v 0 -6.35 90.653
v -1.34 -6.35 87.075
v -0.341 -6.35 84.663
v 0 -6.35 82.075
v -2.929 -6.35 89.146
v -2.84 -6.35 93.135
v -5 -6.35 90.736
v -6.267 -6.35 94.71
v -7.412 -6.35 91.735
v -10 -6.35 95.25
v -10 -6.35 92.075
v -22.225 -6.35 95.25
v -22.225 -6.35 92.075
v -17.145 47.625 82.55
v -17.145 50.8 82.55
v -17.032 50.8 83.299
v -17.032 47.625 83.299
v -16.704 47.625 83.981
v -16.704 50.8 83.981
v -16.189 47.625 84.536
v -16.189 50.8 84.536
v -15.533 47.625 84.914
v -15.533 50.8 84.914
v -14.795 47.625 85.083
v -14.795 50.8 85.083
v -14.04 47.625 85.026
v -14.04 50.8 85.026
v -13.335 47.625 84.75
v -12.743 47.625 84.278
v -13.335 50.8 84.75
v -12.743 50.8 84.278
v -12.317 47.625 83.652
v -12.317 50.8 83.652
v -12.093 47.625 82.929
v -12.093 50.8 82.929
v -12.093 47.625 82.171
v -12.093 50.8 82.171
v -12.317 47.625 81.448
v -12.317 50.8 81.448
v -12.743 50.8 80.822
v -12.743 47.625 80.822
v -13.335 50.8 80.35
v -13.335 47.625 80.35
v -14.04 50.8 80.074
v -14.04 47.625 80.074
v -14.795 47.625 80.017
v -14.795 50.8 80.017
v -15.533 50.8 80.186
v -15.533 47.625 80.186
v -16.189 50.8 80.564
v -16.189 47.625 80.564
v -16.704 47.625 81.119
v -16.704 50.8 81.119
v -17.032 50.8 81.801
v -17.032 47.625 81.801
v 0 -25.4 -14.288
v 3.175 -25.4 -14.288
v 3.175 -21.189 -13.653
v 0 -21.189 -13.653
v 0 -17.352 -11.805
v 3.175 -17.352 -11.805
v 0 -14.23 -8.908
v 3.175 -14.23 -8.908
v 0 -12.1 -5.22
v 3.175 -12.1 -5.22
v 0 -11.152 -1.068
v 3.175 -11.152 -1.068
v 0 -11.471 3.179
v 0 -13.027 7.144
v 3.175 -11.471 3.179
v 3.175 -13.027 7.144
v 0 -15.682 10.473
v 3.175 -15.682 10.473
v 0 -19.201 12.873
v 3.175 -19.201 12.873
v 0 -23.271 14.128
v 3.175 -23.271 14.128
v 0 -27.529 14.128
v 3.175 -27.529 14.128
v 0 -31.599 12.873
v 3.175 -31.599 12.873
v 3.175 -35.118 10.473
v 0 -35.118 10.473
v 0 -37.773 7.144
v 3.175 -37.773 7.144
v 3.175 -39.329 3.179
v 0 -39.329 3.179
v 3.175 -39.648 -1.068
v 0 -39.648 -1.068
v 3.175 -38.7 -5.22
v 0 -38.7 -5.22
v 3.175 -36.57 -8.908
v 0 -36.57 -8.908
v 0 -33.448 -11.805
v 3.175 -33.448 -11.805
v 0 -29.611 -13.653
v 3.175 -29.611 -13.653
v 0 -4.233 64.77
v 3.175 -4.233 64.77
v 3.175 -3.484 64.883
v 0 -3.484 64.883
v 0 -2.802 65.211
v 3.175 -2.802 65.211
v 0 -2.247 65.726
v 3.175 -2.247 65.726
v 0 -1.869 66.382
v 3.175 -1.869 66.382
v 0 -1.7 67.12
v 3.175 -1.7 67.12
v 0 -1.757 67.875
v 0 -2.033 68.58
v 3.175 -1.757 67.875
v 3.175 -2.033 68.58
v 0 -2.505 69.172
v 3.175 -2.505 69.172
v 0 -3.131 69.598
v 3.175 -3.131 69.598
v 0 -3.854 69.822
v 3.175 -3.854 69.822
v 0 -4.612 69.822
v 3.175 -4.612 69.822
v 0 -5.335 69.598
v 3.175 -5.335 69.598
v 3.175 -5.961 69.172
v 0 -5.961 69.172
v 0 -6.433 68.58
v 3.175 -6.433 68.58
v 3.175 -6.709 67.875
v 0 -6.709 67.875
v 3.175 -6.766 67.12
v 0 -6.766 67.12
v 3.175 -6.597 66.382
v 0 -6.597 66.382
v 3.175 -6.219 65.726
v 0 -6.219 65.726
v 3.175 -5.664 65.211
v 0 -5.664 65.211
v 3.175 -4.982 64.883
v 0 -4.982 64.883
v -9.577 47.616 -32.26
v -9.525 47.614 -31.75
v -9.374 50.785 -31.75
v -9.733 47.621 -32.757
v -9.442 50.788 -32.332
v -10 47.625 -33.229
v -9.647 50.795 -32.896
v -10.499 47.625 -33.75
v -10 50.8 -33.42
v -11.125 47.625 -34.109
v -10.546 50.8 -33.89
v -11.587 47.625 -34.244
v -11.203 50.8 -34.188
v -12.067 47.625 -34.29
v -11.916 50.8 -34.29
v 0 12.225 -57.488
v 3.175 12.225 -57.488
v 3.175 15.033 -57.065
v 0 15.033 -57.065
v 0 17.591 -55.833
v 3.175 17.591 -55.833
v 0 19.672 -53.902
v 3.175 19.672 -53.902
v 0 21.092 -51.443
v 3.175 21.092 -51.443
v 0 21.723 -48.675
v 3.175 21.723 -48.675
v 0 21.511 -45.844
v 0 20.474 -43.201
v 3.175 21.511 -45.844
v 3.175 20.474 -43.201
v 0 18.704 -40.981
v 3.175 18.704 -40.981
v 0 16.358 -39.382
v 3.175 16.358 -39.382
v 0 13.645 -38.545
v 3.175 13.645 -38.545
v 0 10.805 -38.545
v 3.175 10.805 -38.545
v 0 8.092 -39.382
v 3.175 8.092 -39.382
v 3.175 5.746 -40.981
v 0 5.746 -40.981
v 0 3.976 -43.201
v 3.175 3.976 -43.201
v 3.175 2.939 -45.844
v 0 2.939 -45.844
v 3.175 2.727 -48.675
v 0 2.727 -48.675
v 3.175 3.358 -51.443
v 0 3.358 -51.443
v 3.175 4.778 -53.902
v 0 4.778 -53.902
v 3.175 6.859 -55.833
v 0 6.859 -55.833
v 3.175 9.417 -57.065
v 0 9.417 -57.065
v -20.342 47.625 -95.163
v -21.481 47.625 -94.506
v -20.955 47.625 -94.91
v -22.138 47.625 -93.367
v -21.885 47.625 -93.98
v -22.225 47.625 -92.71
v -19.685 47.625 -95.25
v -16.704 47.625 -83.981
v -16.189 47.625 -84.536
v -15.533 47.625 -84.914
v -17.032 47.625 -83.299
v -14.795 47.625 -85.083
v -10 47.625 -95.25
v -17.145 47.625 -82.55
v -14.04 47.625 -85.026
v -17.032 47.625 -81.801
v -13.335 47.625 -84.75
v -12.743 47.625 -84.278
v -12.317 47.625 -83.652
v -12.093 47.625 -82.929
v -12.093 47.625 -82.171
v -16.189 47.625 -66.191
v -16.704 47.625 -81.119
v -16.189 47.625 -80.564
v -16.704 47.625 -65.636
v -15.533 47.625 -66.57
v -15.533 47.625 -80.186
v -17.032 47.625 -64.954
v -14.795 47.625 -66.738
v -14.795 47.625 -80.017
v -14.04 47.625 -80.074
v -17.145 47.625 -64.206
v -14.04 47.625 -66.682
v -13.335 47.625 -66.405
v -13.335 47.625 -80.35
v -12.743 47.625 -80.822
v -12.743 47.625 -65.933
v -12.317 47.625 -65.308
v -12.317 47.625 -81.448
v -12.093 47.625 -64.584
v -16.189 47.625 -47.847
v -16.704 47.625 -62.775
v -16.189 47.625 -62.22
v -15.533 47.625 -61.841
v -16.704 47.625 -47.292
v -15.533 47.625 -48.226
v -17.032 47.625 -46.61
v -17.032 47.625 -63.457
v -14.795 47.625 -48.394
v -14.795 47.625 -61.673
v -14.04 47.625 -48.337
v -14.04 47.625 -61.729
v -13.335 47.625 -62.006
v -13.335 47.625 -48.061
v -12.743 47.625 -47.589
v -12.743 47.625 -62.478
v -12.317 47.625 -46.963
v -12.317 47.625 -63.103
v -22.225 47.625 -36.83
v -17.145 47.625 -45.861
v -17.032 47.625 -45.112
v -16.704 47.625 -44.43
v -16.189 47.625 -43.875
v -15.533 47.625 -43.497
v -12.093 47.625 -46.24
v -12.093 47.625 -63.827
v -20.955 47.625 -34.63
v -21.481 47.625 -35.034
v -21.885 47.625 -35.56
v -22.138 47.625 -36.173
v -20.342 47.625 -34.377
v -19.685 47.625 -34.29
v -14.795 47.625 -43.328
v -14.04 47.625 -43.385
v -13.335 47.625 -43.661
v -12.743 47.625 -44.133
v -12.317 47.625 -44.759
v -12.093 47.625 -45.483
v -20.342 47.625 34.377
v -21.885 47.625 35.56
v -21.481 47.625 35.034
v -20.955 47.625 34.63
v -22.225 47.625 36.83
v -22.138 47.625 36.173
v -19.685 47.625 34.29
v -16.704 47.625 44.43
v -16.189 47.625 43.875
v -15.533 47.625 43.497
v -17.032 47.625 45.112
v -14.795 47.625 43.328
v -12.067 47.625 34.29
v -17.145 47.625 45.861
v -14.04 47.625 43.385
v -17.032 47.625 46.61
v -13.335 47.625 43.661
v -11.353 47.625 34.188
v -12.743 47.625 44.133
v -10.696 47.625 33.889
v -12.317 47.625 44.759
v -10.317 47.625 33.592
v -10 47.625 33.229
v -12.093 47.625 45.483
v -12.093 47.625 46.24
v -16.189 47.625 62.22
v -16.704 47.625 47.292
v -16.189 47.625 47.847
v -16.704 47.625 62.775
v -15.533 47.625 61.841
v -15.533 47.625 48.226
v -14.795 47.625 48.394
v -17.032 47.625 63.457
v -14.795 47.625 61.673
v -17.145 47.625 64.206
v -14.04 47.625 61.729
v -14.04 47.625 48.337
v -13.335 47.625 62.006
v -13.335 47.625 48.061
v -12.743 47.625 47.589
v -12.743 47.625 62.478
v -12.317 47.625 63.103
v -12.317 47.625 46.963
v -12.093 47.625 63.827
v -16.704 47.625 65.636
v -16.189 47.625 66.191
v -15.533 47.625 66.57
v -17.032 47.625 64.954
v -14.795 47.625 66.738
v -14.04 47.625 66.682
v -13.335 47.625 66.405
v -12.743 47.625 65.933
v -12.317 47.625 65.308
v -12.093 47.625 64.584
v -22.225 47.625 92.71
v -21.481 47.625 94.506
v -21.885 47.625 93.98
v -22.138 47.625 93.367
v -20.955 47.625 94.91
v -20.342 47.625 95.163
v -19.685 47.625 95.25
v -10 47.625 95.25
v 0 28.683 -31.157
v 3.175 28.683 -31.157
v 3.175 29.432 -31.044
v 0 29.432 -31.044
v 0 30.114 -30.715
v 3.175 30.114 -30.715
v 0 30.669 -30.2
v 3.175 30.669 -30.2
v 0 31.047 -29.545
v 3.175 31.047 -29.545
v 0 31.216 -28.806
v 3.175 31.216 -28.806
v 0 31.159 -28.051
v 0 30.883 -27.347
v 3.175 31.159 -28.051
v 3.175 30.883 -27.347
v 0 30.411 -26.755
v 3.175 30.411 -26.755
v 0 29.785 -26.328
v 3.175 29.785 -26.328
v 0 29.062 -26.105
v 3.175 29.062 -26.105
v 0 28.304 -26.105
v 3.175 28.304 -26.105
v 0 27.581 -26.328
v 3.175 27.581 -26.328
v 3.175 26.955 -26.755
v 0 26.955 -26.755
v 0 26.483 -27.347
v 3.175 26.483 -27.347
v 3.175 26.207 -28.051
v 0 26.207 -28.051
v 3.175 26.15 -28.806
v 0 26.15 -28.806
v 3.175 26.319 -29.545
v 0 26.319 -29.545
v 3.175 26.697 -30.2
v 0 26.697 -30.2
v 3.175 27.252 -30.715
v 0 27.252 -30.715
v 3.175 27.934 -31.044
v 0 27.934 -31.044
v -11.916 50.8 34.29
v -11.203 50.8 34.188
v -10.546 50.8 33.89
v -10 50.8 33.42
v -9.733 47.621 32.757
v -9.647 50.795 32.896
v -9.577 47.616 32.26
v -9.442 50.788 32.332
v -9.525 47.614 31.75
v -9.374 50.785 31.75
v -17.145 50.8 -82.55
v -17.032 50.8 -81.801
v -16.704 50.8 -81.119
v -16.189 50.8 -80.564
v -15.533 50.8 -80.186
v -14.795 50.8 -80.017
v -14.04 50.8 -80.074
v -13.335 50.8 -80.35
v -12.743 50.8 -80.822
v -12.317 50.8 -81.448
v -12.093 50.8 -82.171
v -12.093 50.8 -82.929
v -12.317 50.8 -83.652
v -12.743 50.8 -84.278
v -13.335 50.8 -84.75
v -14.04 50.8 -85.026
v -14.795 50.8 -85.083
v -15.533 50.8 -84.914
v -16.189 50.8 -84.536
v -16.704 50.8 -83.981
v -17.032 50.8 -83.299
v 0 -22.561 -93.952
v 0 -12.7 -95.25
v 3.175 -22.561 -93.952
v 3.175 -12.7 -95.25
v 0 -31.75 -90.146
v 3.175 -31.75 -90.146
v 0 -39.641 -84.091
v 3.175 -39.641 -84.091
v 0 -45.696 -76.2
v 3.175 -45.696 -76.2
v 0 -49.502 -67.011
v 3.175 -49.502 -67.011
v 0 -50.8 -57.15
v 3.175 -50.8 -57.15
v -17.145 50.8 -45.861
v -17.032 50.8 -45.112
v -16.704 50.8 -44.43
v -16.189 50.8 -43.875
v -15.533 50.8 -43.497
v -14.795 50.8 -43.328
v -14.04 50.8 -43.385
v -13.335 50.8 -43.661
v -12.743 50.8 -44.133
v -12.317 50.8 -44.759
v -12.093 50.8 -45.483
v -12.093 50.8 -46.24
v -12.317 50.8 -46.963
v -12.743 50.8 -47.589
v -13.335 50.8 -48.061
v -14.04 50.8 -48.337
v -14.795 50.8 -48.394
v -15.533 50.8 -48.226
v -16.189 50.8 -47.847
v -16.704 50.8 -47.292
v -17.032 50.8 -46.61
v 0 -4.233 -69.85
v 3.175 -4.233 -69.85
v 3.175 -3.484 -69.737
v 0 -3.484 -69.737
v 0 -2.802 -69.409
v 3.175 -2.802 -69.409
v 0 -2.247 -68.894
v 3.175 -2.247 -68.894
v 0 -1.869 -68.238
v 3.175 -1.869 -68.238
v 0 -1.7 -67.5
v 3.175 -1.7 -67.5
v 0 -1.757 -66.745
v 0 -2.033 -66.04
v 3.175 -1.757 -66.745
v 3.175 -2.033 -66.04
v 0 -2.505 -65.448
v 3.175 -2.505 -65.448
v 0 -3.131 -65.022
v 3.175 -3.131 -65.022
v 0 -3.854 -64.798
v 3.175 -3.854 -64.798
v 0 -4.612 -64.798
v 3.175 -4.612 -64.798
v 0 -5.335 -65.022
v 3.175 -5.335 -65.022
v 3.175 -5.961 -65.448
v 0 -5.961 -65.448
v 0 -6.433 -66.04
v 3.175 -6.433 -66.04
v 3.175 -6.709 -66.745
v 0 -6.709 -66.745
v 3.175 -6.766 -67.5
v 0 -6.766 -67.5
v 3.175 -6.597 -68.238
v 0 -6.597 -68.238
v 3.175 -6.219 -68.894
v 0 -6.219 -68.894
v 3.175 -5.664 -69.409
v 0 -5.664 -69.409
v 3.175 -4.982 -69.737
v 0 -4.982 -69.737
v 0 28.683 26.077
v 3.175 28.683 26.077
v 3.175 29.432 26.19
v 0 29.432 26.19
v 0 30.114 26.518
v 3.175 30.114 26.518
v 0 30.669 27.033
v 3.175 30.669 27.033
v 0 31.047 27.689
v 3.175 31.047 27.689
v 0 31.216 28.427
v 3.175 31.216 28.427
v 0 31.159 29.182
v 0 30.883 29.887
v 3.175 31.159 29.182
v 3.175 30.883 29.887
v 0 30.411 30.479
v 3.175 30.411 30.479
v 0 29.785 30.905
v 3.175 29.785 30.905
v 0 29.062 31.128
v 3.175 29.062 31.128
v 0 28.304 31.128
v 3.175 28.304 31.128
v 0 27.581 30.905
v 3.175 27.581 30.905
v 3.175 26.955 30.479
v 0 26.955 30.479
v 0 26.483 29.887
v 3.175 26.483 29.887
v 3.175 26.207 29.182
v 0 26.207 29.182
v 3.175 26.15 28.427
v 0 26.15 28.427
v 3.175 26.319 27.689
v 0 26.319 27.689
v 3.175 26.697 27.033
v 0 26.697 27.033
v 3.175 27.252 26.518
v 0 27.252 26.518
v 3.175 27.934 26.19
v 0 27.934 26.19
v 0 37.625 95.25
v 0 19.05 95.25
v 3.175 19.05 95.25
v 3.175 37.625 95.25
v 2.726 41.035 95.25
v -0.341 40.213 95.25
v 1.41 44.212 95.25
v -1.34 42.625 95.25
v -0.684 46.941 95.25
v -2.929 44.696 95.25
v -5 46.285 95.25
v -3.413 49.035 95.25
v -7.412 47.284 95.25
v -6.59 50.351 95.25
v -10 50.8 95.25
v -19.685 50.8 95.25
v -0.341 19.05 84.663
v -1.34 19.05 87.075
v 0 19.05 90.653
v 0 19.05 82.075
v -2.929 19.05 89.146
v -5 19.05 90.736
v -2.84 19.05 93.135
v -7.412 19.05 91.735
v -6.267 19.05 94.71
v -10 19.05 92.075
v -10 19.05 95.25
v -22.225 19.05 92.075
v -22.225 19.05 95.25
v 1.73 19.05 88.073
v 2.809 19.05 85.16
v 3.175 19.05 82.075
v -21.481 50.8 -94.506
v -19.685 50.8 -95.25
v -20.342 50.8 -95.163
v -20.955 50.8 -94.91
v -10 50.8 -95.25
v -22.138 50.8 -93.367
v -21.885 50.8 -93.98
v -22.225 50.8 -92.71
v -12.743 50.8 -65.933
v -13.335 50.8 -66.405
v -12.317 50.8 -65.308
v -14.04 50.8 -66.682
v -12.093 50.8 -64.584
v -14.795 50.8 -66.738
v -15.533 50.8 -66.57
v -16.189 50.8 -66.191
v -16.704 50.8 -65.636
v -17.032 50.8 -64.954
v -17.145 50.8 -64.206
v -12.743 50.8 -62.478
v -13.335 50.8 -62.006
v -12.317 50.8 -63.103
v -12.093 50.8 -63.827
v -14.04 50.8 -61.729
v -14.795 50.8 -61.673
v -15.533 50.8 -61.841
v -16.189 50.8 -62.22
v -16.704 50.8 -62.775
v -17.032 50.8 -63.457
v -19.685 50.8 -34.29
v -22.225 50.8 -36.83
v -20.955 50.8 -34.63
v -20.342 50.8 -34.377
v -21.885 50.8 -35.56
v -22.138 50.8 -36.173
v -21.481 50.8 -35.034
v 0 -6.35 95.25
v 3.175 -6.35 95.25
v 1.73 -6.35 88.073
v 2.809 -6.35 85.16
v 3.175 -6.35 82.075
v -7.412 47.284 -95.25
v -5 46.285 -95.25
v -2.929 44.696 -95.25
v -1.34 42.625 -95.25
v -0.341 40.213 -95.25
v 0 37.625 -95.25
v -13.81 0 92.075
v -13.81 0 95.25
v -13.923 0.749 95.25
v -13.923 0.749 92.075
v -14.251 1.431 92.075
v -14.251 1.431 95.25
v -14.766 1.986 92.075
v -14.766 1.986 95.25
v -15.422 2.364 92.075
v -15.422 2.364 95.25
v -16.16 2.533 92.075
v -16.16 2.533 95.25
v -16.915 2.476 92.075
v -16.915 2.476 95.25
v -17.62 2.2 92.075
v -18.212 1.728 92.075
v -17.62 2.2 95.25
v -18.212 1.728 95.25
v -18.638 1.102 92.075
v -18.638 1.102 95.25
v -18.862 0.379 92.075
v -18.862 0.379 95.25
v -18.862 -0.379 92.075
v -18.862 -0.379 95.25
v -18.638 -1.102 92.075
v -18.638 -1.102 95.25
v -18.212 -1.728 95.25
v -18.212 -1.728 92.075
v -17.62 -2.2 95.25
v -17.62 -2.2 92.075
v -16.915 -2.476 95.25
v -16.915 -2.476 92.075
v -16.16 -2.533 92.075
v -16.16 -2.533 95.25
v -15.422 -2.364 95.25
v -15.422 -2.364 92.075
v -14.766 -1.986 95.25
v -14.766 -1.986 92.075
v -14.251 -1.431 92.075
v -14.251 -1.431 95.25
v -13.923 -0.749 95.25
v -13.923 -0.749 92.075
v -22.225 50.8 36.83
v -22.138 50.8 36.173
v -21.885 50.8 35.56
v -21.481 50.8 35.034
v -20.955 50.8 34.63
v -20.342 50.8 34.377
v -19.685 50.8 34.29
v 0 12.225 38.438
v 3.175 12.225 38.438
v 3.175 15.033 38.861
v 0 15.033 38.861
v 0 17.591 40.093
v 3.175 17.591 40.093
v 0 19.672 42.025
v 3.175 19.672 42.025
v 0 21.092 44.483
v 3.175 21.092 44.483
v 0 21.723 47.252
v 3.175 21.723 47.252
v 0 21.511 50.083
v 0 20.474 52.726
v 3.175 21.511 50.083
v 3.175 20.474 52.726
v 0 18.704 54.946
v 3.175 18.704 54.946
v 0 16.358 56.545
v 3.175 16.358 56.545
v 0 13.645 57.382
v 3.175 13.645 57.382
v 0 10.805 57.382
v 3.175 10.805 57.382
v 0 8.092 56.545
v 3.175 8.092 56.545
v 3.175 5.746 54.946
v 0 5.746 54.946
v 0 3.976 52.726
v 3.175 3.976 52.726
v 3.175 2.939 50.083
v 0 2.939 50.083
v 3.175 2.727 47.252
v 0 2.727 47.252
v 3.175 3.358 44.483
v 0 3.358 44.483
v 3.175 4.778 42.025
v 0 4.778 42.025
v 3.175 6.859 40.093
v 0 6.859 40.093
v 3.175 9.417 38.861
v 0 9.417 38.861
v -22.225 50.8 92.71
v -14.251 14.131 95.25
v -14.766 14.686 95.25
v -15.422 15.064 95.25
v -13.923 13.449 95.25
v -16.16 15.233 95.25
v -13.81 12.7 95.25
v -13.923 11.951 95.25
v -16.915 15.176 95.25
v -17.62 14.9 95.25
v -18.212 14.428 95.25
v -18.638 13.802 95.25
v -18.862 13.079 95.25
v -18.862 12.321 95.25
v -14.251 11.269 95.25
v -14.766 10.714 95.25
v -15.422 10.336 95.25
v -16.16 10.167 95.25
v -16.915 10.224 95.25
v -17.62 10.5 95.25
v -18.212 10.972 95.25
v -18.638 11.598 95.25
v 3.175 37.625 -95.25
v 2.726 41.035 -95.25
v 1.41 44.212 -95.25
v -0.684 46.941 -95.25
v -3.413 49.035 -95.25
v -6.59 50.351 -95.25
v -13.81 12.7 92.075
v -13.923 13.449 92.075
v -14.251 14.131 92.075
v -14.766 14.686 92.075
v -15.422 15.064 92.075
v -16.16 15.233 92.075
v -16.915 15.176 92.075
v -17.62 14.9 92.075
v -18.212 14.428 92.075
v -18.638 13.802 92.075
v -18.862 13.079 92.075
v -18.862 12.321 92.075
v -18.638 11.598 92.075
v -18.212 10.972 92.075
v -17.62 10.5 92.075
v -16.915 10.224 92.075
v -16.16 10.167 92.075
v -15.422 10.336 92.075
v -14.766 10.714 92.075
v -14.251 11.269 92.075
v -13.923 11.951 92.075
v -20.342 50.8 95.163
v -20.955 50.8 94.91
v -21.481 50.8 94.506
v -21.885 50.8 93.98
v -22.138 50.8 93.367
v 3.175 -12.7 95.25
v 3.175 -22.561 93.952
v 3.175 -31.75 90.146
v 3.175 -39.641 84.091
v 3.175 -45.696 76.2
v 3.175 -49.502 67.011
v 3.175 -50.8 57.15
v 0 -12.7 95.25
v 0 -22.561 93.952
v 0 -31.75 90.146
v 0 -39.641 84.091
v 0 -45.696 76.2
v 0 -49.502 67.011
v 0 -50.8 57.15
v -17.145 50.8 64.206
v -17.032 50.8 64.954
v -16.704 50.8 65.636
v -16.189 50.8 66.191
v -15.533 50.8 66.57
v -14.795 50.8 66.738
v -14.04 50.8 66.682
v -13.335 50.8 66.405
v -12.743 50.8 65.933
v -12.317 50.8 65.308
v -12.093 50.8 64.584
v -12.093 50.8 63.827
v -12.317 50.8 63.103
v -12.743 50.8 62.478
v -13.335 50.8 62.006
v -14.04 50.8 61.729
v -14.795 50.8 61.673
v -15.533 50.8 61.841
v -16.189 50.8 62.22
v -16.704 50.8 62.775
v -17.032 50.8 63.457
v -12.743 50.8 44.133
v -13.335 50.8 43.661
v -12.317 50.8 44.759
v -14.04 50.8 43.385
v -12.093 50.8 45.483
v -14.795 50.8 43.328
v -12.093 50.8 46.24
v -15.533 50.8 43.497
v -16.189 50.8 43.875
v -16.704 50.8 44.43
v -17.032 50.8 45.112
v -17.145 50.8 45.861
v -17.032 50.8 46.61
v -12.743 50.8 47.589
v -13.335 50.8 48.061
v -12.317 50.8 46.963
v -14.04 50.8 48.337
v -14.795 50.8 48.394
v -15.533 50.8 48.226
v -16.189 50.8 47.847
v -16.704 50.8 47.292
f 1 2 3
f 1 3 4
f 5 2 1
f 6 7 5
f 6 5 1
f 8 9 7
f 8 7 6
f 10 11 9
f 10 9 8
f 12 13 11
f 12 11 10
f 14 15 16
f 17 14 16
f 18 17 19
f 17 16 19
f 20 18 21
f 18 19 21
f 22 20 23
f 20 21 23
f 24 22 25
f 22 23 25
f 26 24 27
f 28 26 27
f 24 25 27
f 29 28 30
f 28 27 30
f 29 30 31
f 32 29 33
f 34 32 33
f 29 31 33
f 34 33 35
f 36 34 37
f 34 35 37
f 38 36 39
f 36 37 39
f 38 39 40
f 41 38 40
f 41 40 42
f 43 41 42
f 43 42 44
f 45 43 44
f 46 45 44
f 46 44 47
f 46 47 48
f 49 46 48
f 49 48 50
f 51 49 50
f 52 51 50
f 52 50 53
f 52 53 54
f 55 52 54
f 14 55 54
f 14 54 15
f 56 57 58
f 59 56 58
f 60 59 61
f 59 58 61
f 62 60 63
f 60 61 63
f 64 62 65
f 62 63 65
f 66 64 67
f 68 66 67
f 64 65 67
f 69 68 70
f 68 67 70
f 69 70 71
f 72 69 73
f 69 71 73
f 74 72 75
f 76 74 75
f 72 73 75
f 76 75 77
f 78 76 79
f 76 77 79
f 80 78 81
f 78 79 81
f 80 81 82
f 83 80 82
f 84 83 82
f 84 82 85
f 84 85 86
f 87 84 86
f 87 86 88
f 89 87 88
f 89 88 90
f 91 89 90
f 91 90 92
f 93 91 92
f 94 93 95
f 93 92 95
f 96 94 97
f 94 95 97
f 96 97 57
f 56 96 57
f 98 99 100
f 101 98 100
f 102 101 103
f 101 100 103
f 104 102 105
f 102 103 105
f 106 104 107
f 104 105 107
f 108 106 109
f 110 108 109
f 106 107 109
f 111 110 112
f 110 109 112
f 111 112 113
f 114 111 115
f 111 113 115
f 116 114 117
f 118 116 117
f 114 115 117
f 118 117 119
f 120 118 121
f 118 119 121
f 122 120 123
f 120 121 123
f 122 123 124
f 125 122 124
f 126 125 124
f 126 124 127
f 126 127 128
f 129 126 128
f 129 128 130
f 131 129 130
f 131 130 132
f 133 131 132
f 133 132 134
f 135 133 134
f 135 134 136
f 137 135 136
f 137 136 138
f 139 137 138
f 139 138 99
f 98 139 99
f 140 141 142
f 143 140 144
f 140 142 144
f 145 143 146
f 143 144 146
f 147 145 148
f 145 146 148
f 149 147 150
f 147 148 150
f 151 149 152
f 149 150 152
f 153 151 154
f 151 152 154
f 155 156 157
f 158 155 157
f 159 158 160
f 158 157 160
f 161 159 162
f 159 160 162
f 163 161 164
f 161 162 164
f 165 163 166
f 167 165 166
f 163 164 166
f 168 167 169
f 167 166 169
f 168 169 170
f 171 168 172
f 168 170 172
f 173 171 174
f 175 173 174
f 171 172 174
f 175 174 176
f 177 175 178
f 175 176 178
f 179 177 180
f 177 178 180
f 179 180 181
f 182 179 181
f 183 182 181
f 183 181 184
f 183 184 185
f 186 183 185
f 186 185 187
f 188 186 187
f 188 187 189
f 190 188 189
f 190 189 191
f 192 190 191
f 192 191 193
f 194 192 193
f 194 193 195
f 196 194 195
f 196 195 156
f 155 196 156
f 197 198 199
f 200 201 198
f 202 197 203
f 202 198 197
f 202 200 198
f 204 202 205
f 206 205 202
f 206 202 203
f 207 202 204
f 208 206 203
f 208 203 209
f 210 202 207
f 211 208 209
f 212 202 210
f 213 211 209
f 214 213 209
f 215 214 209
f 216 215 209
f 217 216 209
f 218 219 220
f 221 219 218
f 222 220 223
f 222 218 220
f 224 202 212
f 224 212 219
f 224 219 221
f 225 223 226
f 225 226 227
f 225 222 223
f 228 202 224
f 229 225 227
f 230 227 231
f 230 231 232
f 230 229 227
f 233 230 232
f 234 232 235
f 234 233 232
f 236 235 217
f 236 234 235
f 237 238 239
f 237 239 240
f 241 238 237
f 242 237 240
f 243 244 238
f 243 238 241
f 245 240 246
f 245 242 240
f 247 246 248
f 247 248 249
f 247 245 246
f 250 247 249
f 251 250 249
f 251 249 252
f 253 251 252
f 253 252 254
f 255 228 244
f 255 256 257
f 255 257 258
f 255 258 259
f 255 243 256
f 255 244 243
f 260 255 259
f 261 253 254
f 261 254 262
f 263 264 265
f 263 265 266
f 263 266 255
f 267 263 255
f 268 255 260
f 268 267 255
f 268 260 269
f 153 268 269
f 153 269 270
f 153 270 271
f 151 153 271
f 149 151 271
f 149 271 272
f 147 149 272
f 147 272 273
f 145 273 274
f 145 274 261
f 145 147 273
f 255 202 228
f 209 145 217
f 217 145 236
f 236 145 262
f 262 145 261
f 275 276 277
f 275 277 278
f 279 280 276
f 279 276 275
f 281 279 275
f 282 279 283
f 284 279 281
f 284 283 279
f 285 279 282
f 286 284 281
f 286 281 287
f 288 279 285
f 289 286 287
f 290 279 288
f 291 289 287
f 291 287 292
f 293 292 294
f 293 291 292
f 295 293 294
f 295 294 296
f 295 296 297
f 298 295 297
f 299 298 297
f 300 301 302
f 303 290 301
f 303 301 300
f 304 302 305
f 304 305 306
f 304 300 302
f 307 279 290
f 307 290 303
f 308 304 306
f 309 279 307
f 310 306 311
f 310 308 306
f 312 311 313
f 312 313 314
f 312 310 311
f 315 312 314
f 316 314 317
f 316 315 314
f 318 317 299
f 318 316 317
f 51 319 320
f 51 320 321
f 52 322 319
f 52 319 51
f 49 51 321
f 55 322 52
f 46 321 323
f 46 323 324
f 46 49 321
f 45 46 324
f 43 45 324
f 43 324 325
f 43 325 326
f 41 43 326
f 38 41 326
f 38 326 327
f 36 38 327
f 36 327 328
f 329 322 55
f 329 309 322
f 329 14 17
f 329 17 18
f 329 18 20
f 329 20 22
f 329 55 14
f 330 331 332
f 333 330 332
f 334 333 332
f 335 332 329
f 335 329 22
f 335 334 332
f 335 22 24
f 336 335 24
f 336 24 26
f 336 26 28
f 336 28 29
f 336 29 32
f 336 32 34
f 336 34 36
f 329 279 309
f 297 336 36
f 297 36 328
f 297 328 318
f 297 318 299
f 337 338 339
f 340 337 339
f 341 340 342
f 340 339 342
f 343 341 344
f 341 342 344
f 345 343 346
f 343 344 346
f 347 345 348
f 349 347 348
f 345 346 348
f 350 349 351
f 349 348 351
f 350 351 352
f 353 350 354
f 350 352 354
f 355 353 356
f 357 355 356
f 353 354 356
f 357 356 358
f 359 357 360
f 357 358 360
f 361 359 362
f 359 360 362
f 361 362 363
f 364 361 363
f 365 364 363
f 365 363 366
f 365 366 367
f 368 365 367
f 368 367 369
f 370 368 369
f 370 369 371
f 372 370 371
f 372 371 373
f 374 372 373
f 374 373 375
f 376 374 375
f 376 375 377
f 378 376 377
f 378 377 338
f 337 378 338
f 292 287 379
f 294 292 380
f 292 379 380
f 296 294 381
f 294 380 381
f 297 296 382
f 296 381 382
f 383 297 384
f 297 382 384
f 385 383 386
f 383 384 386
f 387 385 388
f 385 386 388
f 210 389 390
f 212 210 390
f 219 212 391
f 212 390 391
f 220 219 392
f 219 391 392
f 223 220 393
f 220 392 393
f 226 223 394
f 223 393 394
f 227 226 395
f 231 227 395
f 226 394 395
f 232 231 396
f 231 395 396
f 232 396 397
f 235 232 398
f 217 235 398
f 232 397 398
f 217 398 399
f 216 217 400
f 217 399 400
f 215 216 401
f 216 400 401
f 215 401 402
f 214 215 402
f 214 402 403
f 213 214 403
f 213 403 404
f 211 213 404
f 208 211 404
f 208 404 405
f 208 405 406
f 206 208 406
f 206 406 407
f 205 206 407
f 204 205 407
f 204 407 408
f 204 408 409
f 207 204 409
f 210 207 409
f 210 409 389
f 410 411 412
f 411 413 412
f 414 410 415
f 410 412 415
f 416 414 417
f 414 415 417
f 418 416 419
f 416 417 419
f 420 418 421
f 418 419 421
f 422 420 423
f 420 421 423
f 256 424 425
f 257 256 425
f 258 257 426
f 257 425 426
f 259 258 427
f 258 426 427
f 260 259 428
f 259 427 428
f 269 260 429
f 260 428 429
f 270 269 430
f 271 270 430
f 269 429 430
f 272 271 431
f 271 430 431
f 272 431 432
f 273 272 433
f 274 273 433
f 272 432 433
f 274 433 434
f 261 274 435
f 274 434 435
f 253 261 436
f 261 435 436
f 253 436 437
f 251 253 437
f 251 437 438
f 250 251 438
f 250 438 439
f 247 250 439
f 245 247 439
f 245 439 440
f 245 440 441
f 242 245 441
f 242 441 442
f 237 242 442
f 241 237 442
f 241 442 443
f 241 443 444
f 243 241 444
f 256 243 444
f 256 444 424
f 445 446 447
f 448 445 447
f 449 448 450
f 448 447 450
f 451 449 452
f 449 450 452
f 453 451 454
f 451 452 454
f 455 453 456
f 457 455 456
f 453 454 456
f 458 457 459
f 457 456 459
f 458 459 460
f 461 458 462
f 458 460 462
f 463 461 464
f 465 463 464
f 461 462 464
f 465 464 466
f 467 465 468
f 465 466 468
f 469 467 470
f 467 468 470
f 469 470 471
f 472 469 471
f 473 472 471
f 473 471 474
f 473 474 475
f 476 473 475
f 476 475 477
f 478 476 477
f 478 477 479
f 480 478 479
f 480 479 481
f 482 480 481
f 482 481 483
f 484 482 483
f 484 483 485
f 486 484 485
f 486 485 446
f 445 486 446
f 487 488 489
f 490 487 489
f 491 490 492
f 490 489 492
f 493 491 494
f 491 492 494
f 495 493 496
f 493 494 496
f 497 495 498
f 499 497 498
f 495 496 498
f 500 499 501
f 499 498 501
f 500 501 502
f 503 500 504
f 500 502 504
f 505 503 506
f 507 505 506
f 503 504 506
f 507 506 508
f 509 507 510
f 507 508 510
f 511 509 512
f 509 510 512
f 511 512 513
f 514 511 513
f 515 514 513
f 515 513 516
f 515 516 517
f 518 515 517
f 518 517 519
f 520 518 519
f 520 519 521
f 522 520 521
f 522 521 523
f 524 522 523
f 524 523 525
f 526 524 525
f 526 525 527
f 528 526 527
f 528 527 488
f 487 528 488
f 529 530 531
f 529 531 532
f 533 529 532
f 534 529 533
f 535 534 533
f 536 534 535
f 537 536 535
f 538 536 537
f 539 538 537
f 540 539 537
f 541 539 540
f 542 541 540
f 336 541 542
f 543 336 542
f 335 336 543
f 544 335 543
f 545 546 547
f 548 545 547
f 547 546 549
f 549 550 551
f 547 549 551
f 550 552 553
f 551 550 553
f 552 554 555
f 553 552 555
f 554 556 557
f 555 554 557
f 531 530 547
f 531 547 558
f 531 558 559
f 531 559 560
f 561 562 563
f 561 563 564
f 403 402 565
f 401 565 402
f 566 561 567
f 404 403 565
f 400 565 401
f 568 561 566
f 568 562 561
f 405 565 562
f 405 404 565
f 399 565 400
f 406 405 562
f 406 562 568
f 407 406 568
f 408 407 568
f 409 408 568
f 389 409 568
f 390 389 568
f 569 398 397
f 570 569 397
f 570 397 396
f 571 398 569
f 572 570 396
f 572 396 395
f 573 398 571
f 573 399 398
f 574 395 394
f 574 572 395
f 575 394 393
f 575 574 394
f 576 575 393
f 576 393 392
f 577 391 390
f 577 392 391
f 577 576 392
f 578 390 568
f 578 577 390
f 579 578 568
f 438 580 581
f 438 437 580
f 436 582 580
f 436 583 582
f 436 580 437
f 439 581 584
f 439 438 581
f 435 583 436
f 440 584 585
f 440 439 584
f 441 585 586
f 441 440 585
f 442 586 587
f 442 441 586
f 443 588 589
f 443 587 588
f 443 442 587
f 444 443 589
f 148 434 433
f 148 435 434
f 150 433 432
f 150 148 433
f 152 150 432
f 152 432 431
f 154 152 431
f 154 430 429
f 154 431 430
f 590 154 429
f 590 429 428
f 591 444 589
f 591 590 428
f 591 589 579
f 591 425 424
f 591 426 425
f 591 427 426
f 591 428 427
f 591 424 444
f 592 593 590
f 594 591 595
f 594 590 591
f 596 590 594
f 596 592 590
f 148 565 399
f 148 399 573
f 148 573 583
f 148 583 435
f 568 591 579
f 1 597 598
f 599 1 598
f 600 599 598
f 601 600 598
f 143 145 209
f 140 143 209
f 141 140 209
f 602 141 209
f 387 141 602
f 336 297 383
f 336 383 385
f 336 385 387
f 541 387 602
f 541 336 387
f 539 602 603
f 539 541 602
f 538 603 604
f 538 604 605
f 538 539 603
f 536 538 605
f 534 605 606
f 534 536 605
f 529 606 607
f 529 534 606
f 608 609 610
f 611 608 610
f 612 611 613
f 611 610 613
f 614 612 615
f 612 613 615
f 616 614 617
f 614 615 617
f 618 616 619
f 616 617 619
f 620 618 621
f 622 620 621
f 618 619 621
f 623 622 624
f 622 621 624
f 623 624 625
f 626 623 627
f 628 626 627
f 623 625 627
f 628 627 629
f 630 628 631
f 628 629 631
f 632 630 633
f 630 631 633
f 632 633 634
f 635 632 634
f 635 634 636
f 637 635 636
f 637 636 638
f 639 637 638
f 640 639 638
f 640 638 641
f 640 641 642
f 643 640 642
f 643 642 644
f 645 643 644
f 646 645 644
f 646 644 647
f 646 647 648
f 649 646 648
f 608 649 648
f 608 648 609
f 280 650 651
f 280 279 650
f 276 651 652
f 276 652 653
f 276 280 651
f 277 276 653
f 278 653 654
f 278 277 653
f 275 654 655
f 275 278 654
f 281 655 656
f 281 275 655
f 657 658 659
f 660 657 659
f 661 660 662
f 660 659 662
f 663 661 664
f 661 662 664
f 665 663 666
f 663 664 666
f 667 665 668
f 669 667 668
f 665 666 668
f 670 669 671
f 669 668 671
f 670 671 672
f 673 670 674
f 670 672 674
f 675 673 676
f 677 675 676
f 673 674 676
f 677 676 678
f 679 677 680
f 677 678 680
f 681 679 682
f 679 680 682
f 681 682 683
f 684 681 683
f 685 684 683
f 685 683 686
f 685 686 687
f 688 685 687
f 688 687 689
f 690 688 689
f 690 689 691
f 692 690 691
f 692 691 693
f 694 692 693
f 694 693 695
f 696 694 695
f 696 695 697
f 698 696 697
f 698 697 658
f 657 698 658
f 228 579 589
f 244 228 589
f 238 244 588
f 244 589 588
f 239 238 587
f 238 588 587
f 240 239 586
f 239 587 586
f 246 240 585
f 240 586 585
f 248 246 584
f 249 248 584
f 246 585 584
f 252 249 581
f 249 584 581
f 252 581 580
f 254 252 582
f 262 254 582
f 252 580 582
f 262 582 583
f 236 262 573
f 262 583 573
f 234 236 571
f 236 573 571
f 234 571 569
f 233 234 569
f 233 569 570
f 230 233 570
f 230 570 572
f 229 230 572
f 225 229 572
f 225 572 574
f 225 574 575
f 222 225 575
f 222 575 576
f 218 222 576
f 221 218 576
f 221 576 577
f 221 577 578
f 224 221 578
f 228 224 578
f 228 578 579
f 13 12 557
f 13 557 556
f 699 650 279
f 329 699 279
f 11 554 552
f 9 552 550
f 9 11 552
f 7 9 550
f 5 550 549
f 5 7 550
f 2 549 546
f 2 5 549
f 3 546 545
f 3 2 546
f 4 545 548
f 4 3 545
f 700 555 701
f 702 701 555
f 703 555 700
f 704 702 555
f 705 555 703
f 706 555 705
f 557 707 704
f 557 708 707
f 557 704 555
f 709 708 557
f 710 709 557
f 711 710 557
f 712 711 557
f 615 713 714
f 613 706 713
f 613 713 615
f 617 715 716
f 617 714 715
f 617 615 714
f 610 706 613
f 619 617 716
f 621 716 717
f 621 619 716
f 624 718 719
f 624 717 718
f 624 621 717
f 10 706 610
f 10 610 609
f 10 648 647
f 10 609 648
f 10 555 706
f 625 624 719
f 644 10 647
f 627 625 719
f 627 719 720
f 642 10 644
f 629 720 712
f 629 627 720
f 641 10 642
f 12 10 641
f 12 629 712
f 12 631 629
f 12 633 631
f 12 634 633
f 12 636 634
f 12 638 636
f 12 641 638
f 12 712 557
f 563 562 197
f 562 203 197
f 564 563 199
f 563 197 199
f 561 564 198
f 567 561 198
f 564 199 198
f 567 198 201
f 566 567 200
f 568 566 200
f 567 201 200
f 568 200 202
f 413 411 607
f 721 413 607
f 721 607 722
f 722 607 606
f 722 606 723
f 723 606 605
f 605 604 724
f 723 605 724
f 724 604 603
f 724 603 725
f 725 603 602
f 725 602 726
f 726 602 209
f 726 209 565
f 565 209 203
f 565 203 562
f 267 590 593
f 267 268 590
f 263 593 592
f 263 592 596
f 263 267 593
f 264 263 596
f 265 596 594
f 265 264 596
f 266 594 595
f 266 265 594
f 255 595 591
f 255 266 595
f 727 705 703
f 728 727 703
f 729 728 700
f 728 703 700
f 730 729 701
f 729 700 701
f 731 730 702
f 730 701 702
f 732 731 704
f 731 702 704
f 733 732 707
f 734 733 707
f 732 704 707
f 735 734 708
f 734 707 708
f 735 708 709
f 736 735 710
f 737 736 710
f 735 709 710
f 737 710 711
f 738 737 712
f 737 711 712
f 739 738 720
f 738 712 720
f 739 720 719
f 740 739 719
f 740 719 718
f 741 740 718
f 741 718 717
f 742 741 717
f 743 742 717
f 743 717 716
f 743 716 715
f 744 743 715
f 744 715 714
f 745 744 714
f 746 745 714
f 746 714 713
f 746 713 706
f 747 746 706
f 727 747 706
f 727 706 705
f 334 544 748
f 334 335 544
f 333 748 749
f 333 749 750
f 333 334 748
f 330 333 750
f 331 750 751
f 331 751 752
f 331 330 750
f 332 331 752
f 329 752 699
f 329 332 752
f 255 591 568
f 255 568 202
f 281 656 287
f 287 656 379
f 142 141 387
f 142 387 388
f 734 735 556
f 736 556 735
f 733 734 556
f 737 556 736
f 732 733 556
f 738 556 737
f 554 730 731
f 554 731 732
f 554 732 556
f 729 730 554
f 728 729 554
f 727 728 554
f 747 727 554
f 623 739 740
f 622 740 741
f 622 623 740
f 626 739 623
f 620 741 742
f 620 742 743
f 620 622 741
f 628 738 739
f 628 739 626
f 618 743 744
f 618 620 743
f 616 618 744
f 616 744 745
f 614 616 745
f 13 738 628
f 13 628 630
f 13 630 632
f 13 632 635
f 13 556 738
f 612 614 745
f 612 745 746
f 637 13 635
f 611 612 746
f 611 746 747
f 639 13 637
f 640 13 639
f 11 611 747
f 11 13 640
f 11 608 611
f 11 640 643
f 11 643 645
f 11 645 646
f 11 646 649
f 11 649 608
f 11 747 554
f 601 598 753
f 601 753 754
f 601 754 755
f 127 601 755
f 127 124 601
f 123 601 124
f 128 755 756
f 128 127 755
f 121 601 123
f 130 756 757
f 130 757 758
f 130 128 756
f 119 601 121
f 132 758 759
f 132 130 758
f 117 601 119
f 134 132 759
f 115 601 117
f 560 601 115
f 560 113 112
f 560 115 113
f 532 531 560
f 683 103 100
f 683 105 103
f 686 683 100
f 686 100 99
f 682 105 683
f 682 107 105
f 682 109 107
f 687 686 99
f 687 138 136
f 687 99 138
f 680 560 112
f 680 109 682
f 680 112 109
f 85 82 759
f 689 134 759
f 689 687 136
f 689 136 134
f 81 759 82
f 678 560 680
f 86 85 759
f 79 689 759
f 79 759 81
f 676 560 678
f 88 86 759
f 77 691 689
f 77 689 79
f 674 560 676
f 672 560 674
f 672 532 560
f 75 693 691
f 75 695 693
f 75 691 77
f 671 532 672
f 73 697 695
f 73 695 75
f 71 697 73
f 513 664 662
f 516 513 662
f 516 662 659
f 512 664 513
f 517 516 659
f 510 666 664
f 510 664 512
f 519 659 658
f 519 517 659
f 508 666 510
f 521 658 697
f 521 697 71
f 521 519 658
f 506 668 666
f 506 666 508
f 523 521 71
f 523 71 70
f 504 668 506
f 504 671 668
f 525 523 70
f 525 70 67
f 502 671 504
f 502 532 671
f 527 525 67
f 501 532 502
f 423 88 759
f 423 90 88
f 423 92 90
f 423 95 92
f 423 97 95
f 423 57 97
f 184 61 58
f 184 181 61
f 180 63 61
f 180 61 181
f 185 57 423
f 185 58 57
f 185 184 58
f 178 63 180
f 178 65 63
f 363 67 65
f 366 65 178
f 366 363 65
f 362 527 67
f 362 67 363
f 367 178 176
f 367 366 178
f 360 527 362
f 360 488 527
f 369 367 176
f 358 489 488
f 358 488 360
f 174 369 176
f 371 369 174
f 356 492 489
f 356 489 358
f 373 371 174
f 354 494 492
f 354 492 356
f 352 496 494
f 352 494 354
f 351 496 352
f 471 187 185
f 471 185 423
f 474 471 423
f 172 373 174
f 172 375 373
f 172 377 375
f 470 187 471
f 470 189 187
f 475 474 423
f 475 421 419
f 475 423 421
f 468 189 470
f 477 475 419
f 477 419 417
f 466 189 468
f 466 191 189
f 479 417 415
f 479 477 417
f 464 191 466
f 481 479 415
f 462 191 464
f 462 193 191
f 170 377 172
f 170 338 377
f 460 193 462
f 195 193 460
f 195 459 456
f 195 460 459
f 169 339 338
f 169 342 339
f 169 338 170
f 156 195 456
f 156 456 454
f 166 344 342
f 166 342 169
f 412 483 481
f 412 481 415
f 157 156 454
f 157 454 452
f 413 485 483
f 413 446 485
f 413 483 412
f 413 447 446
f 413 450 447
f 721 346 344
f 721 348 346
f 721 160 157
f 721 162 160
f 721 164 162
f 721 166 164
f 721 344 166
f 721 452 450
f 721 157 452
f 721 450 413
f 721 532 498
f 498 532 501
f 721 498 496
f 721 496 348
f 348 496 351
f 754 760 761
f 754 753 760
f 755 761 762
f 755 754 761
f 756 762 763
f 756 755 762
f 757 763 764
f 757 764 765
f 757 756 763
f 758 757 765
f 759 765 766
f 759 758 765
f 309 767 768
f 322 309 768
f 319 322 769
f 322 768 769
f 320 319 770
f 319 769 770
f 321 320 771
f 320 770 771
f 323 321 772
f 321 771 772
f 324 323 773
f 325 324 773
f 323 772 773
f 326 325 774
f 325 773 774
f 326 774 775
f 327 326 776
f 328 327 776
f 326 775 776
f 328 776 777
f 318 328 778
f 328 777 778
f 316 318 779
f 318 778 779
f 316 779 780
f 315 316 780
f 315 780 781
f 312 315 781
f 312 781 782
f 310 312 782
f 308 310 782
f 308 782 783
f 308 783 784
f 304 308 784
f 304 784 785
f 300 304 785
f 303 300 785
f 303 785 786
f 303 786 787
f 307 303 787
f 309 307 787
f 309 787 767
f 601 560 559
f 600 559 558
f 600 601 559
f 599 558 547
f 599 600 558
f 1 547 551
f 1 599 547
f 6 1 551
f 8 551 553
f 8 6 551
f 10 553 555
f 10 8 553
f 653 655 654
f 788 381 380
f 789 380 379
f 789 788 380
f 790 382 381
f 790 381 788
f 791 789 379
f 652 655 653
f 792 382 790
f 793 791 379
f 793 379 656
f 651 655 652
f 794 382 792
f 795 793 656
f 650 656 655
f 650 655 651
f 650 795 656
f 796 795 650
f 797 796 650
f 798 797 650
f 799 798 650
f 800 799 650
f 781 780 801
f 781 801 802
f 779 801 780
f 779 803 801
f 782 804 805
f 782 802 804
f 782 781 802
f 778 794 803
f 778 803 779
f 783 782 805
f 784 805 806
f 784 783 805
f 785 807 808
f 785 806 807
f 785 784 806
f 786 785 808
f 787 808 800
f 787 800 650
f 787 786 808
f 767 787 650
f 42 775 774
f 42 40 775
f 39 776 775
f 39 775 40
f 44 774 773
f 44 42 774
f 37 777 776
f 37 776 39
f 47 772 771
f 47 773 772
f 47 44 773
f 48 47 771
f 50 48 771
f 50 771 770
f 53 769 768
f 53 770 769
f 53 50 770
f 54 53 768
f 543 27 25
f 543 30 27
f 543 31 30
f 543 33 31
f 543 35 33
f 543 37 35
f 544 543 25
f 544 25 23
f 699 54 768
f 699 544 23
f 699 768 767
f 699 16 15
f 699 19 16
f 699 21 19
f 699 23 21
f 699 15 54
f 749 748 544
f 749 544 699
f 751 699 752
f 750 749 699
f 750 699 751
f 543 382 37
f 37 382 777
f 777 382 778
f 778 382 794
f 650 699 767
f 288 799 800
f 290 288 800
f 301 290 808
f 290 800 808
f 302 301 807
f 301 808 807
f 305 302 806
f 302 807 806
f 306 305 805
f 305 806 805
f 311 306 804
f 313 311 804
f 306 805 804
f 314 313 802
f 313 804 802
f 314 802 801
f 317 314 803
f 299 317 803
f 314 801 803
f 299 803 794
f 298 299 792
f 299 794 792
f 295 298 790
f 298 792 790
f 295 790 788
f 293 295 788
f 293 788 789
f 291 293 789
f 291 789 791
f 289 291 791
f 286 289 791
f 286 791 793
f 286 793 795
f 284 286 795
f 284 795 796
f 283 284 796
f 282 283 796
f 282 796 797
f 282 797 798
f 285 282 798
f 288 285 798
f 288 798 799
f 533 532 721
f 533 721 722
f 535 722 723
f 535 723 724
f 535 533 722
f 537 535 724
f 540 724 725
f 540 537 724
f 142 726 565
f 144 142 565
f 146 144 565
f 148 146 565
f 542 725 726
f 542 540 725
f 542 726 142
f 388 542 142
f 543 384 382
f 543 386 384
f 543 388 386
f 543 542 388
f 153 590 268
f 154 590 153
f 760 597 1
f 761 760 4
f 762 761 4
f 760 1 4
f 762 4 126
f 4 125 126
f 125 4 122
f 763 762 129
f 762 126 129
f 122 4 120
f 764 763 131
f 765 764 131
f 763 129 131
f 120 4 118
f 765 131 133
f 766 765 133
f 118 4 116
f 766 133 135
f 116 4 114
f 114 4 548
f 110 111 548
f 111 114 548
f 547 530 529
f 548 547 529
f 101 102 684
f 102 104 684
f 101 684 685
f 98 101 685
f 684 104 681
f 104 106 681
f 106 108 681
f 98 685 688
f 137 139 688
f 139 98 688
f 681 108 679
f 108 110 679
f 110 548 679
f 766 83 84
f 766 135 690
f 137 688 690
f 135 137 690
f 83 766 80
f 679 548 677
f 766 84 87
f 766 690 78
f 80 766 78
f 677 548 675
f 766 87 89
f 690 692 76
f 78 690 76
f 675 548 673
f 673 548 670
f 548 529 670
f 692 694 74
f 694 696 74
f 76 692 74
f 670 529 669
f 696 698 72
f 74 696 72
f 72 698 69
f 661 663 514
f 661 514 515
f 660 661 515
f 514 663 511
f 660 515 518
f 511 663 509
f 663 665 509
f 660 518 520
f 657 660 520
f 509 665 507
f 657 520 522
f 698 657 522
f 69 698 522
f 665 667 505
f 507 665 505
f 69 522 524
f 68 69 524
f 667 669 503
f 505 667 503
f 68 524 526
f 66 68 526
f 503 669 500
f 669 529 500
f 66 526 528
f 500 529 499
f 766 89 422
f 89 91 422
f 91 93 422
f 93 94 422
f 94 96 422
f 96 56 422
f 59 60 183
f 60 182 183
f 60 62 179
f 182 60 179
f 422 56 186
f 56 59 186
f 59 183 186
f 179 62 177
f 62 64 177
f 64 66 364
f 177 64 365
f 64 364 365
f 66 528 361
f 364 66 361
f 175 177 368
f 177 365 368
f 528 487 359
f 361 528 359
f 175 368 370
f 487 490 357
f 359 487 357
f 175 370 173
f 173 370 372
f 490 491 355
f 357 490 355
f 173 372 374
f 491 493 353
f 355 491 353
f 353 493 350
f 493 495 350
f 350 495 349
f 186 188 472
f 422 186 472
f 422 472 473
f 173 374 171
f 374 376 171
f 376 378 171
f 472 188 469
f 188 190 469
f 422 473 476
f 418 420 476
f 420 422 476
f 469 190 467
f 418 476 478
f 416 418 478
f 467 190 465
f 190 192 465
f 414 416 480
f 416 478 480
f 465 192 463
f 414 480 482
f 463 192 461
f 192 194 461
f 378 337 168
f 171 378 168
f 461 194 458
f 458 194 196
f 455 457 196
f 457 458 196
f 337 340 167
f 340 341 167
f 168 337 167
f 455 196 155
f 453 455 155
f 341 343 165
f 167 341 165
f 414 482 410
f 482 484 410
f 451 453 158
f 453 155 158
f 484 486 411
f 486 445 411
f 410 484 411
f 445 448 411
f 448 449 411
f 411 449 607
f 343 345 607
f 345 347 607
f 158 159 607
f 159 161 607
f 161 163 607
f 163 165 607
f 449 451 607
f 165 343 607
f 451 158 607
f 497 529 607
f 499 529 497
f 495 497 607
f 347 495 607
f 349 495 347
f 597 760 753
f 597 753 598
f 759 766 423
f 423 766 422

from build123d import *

# Parameters (mm, degrees)
SKETCH1_W                    = 190.5
SKETCH1_H                    = 101.6
BOSS_EXTRUDE1_DEPTH          = 3.175
SKETCH2_R                    = 14.2875
CUT_EXTRUDE1_DEPTH           = 3.175
EDGE_FLANGE1_STRIP_W         = 32.7
EDGE_FLANGE1_STRIP_H         = 3.175
EDGE_FLANGE1_STRIP_CUT_DEPTH = 190.5
EDGE_FLANGE1_DEPTH           = 190.5
SKETCH12_R                   = 9.525
SKETCH12_R_2                 = 2.54
CUT_EXTRUDE2_DEPTH           = 27.94
FILLET1_R                    = 38.1
SKETCH15_W                   = 3.175
SKETCH15_H                   = 25.4
BOSS_EXTRUDE2_DEPTH          = 0.000254
EDGE_FLANGE4_STRIP_W         = 32.7
EDGE_FLANGE4_STRIP_H         = 3.175
EDGE_FLANGE4_STRIP_CUT_DEPTH = 25.4
EDGE_FLANGE4_DEPTH           = 25.4
SKETCH26_R                   = 2.54
CUT_EXTRUDE3_DEPTH           = 142.028796748
SKETCH27_R                   = 2.54
CUT_EXTRUDE4_DEPTH           = 199.405991339
CUT_EXTRUDE5_START           = -34.29
CUT_EXTRUDE5_DEPTH           = 68.58
FILLET2_R                    = 2.54


# Read off the part's stored shape, not the designer's step: Cut-Extrude5
# Sheet-metal steps are written as plain solids
with BuildPart() as part:
    # Sketch1 → Boss-Extrude1 (new body)
    with BuildSketch(Plane(origin=(0, 0, 0), x_dir=(0, 0, -1), z_dir=(1, 0, 0))):
        Rectangle(SKETCH1_W, SKETCH1_H)
    extrude(amount=BOSS_EXTRUDE1_DEPTH)

    # Sketch2 → Cut-Extrude1 (cut)
    with BuildSketch(Plane(origin=(3.175, 0, 0), x_dir=(0, 0, -1), z_dir=(1, 0, 0))):
        with Locations((0, -25.4)):
            Circle(SKETCH2_R)
    extrude(amount=-CUT_EXTRUDE1_DEPTH, mode=Mode.SUBTRACT)

    # Edge-Flange1 strip (across the edge) → Edge-Flange1 strip cut (cut)
    with BuildSketch(Plane(origin=(0, 50.8, 95.25), x_dir=(0, -1, 0), z_dir=(0, 0, -1))):
        with Locations((-3.175, -1.5875)):
            Rectangle(EDGE_FLANGE1_STRIP_W, EDGE_FLANGE1_STRIP_H)
    extrude(amount=EDGE_FLANGE1_STRIP_CUT_DEPTH, mode=Mode.SUBTRACT)

    # Edge-Flange1 section (across the edge) → Edge-Flange1 (add)
    with BuildSketch(Plane(origin=(0, 50.8, 95.25), x_dir=(0, -1, 0), z_dir=(0, 0, -1))):
        with BuildLine():
            Line((0, 10), (0, 22.225))
            Line((0, 22.225), (3.175, 22.225))
            Line((3.175, 22.225), (3.175, 10))
            ThreePointArc((3.175, 10), (6.103932188, 2.928932188), (13.175, 0))
            Line((13.175, 0), (13.175, -3.175))
            ThreePointArc((13.175, -3.175), (3.858868158, 0.683868158), (0, 10))
        make_face()
    extrude(amount=EDGE_FLANGE1_DEPTH)

    # Sketch12 → Cut-Extrude2 (cut)
    with BuildSketch(Plane(origin=(3.175, 0, 0), x_dir=(0, 0, -1), z_dir=(1, 0, 0))):
        with Locations((-47.963329482, 12.225)):
            Circle(SKETCH12_R)
        with Locations((-28.616658964, 28.683017495)):
            Circle(SKETCH12_R_2)
        with Locations((-67.31, -4.233017495)):
            Circle(SKETCH12_R_2)
        with Locations((47.963329482, 12.225)):
            Circle(SKETCH12_R)
        with Locations((28.616658964, 28.683017495)):
            Circle(SKETCH12_R_2)
        with Locations((67.31, -4.233017495)):
            Circle(SKETCH12_R_2)
    extrude(amount=-CUT_EXTRUDE2_DEPTH, mode=Mode.SUBTRACT)

    # Fillet1
    fillet1_edges = [part.edges().sort_by_distance(p)[0] for p in [
        (1.5875, -50.8, 95.25),
        (1.5875, -50.8, -95.25),
    ]]
    fillet(fillet1_edges, radius=FILLET1_R)

    # Sketch15 → Boss-Extrude2 (add)
    with BuildSketch(Plane.XY.offset(95.25)):
        with Locations((1.5875, 6.35)):
            Rectangle(SKETCH15_W, SKETCH15_H)
    extrude(amount=BOSS_EXTRUDE2_DEPTH)

    # Edge-Flange4 strip (across the edge) → Edge-Flange4 strip cut (cut)
    with BuildSketch(Plane(origin=(0, -6.35, 95.250254), x_dir=(0, 0, -1), z_dir=(0, 1, 0))):
        with Locations((-3.175, -1.5875)):
            Rectangle(EDGE_FLANGE4_STRIP_W, EDGE_FLANGE4_STRIP_H)
    extrude(amount=EDGE_FLANGE4_STRIP_CUT_DEPTH, mode=Mode.SUBTRACT)

    # Edge-Flange4 section (across the edge) → Edge-Flange4 (add)
    with BuildSketch(Plane(origin=(0, -6.35, 95.250254), x_dir=(0, 0, -1), z_dir=(0, 1, 0))):
        with BuildLine():
            Line((0, 10), (0, 22.225))
            Line((0, 22.225), (3.175, 22.225))
            Line((3.175, 22.225), (3.175, 10))
            ThreePointArc((3.175, 10), (6.103932188, 2.928932188), (13.175, 0))
            Line((13.175, 0), (13.175, -3.175))
            ThreePointArc((13.175, -3.175), (3.858868158, 0.683868158), (0, 10))
        make_face()
    extrude(amount=EDGE_FLANGE4_DEPTH)

    # Sketch26 → Cut-Extrude3 (cut, through all)
    with BuildSketch(Plane(origin=(0, 50.8, 0), x_dir=(1, 0, 0), z_dir=(0, 1, 0))):
        with Locations(Location((-14.605, -82.55, 0), (0, 0, 180))):
            Circle(SKETCH26_R)
        with Locations(Location((-14.605, -64.205555556, 0), (0, 0, 180))):
            Circle(SKETCH26_R)
        with Locations(Location((-14.605, -45.861111111, 0), (0, 0, 180))):
            Circle(SKETCH26_R)
        with Locations(Location((-14.605, -27.516666667, 0), (0, 0, 180))):
            Circle(SKETCH26_R)
        with Locations(Location((-14.605, -9.172222222, 0), (0, 0, 180))):
            Circle(SKETCH26_R)
        with Locations(Location((-14.605, 9.172222222, 0), (0, 0, 180))):
            Circle(SKETCH26_R)
        with Locations(Location((-14.605, 27.516666667, 0), (0, 0, 180))):
            Circle(SKETCH26_R)
        with Locations(Location((-14.605, 45.861111111, 0), (0, 0, 180))):
            Circle(SKETCH26_R)
        with Locations(Location((-14.605, 64.205555556, 0), (0, 0, 180))):
            Circle(SKETCH26_R)
        with Locations(Location((-14.605, 82.55, 0), (0, 0, 180))):
            Circle(SKETCH26_R)
    extrude(amount=-CUT_EXTRUDE3_DEPTH, mode=Mode.SUBTRACT)

    # Sketch27 → Cut-Extrude4 (cut, through all)
    with BuildSketch(Plane.XY.offset(95.250254)):
        with Locations((-16.35, 12.7)):
            Circle(SKETCH27_R)
        with Locations((-16.35, 0)):
            Circle(SKETCH27_R)
    extrude(amount=-CUT_EXTRUDE4_DEPTH, mode=Mode.SUBTRACT)

    # Cut-Extrude5 outline → Cut-Extrude5 (cut)
    with BuildSketch(Plane.XY.offset(CUT_EXTRUDE5_START)):
        with BuildLine():
            ThreePointArc((-10, 47.625), (-9.762432951, 47.622177697), (-9.525, 47.61371238))
            Line((-9.525, 47.61371238), (-9.3741875, 50.78512856))
            ThreePointArc((-9.3741875, 50.78512856), (-9.687005413, 50.796281615), (-10, 50.8))
            Line((-10, 50.8), (-22.225, 50.8))
            Line((-22.225, 50.8), (-22.225, 47.625))
            Line((-22.225, 47.625), (-10, 47.625))
        make_face()
    extrude(amount=CUT_EXTRUDE5_DEPTH, mode=Mode.SUBTRACT)

    # Fillet2
    fillet2_edges = [part.edges().sort_by_distance(p)[0] for p in [
        (-22.225, 49.2125, 95.25),
        (-22.225, 49.2125, 34.29),
        (-9.44959375, 49.19942047, 34.29),
        (-9.44959375, 49.19942047, -34.29),
        (-22.225, 49.2125, -34.29),
        (-22.225, 49.2125, -95.25),
    ]]
    fillet(fillet2_edges, radius=FILLET2_R)


solid = part.part
